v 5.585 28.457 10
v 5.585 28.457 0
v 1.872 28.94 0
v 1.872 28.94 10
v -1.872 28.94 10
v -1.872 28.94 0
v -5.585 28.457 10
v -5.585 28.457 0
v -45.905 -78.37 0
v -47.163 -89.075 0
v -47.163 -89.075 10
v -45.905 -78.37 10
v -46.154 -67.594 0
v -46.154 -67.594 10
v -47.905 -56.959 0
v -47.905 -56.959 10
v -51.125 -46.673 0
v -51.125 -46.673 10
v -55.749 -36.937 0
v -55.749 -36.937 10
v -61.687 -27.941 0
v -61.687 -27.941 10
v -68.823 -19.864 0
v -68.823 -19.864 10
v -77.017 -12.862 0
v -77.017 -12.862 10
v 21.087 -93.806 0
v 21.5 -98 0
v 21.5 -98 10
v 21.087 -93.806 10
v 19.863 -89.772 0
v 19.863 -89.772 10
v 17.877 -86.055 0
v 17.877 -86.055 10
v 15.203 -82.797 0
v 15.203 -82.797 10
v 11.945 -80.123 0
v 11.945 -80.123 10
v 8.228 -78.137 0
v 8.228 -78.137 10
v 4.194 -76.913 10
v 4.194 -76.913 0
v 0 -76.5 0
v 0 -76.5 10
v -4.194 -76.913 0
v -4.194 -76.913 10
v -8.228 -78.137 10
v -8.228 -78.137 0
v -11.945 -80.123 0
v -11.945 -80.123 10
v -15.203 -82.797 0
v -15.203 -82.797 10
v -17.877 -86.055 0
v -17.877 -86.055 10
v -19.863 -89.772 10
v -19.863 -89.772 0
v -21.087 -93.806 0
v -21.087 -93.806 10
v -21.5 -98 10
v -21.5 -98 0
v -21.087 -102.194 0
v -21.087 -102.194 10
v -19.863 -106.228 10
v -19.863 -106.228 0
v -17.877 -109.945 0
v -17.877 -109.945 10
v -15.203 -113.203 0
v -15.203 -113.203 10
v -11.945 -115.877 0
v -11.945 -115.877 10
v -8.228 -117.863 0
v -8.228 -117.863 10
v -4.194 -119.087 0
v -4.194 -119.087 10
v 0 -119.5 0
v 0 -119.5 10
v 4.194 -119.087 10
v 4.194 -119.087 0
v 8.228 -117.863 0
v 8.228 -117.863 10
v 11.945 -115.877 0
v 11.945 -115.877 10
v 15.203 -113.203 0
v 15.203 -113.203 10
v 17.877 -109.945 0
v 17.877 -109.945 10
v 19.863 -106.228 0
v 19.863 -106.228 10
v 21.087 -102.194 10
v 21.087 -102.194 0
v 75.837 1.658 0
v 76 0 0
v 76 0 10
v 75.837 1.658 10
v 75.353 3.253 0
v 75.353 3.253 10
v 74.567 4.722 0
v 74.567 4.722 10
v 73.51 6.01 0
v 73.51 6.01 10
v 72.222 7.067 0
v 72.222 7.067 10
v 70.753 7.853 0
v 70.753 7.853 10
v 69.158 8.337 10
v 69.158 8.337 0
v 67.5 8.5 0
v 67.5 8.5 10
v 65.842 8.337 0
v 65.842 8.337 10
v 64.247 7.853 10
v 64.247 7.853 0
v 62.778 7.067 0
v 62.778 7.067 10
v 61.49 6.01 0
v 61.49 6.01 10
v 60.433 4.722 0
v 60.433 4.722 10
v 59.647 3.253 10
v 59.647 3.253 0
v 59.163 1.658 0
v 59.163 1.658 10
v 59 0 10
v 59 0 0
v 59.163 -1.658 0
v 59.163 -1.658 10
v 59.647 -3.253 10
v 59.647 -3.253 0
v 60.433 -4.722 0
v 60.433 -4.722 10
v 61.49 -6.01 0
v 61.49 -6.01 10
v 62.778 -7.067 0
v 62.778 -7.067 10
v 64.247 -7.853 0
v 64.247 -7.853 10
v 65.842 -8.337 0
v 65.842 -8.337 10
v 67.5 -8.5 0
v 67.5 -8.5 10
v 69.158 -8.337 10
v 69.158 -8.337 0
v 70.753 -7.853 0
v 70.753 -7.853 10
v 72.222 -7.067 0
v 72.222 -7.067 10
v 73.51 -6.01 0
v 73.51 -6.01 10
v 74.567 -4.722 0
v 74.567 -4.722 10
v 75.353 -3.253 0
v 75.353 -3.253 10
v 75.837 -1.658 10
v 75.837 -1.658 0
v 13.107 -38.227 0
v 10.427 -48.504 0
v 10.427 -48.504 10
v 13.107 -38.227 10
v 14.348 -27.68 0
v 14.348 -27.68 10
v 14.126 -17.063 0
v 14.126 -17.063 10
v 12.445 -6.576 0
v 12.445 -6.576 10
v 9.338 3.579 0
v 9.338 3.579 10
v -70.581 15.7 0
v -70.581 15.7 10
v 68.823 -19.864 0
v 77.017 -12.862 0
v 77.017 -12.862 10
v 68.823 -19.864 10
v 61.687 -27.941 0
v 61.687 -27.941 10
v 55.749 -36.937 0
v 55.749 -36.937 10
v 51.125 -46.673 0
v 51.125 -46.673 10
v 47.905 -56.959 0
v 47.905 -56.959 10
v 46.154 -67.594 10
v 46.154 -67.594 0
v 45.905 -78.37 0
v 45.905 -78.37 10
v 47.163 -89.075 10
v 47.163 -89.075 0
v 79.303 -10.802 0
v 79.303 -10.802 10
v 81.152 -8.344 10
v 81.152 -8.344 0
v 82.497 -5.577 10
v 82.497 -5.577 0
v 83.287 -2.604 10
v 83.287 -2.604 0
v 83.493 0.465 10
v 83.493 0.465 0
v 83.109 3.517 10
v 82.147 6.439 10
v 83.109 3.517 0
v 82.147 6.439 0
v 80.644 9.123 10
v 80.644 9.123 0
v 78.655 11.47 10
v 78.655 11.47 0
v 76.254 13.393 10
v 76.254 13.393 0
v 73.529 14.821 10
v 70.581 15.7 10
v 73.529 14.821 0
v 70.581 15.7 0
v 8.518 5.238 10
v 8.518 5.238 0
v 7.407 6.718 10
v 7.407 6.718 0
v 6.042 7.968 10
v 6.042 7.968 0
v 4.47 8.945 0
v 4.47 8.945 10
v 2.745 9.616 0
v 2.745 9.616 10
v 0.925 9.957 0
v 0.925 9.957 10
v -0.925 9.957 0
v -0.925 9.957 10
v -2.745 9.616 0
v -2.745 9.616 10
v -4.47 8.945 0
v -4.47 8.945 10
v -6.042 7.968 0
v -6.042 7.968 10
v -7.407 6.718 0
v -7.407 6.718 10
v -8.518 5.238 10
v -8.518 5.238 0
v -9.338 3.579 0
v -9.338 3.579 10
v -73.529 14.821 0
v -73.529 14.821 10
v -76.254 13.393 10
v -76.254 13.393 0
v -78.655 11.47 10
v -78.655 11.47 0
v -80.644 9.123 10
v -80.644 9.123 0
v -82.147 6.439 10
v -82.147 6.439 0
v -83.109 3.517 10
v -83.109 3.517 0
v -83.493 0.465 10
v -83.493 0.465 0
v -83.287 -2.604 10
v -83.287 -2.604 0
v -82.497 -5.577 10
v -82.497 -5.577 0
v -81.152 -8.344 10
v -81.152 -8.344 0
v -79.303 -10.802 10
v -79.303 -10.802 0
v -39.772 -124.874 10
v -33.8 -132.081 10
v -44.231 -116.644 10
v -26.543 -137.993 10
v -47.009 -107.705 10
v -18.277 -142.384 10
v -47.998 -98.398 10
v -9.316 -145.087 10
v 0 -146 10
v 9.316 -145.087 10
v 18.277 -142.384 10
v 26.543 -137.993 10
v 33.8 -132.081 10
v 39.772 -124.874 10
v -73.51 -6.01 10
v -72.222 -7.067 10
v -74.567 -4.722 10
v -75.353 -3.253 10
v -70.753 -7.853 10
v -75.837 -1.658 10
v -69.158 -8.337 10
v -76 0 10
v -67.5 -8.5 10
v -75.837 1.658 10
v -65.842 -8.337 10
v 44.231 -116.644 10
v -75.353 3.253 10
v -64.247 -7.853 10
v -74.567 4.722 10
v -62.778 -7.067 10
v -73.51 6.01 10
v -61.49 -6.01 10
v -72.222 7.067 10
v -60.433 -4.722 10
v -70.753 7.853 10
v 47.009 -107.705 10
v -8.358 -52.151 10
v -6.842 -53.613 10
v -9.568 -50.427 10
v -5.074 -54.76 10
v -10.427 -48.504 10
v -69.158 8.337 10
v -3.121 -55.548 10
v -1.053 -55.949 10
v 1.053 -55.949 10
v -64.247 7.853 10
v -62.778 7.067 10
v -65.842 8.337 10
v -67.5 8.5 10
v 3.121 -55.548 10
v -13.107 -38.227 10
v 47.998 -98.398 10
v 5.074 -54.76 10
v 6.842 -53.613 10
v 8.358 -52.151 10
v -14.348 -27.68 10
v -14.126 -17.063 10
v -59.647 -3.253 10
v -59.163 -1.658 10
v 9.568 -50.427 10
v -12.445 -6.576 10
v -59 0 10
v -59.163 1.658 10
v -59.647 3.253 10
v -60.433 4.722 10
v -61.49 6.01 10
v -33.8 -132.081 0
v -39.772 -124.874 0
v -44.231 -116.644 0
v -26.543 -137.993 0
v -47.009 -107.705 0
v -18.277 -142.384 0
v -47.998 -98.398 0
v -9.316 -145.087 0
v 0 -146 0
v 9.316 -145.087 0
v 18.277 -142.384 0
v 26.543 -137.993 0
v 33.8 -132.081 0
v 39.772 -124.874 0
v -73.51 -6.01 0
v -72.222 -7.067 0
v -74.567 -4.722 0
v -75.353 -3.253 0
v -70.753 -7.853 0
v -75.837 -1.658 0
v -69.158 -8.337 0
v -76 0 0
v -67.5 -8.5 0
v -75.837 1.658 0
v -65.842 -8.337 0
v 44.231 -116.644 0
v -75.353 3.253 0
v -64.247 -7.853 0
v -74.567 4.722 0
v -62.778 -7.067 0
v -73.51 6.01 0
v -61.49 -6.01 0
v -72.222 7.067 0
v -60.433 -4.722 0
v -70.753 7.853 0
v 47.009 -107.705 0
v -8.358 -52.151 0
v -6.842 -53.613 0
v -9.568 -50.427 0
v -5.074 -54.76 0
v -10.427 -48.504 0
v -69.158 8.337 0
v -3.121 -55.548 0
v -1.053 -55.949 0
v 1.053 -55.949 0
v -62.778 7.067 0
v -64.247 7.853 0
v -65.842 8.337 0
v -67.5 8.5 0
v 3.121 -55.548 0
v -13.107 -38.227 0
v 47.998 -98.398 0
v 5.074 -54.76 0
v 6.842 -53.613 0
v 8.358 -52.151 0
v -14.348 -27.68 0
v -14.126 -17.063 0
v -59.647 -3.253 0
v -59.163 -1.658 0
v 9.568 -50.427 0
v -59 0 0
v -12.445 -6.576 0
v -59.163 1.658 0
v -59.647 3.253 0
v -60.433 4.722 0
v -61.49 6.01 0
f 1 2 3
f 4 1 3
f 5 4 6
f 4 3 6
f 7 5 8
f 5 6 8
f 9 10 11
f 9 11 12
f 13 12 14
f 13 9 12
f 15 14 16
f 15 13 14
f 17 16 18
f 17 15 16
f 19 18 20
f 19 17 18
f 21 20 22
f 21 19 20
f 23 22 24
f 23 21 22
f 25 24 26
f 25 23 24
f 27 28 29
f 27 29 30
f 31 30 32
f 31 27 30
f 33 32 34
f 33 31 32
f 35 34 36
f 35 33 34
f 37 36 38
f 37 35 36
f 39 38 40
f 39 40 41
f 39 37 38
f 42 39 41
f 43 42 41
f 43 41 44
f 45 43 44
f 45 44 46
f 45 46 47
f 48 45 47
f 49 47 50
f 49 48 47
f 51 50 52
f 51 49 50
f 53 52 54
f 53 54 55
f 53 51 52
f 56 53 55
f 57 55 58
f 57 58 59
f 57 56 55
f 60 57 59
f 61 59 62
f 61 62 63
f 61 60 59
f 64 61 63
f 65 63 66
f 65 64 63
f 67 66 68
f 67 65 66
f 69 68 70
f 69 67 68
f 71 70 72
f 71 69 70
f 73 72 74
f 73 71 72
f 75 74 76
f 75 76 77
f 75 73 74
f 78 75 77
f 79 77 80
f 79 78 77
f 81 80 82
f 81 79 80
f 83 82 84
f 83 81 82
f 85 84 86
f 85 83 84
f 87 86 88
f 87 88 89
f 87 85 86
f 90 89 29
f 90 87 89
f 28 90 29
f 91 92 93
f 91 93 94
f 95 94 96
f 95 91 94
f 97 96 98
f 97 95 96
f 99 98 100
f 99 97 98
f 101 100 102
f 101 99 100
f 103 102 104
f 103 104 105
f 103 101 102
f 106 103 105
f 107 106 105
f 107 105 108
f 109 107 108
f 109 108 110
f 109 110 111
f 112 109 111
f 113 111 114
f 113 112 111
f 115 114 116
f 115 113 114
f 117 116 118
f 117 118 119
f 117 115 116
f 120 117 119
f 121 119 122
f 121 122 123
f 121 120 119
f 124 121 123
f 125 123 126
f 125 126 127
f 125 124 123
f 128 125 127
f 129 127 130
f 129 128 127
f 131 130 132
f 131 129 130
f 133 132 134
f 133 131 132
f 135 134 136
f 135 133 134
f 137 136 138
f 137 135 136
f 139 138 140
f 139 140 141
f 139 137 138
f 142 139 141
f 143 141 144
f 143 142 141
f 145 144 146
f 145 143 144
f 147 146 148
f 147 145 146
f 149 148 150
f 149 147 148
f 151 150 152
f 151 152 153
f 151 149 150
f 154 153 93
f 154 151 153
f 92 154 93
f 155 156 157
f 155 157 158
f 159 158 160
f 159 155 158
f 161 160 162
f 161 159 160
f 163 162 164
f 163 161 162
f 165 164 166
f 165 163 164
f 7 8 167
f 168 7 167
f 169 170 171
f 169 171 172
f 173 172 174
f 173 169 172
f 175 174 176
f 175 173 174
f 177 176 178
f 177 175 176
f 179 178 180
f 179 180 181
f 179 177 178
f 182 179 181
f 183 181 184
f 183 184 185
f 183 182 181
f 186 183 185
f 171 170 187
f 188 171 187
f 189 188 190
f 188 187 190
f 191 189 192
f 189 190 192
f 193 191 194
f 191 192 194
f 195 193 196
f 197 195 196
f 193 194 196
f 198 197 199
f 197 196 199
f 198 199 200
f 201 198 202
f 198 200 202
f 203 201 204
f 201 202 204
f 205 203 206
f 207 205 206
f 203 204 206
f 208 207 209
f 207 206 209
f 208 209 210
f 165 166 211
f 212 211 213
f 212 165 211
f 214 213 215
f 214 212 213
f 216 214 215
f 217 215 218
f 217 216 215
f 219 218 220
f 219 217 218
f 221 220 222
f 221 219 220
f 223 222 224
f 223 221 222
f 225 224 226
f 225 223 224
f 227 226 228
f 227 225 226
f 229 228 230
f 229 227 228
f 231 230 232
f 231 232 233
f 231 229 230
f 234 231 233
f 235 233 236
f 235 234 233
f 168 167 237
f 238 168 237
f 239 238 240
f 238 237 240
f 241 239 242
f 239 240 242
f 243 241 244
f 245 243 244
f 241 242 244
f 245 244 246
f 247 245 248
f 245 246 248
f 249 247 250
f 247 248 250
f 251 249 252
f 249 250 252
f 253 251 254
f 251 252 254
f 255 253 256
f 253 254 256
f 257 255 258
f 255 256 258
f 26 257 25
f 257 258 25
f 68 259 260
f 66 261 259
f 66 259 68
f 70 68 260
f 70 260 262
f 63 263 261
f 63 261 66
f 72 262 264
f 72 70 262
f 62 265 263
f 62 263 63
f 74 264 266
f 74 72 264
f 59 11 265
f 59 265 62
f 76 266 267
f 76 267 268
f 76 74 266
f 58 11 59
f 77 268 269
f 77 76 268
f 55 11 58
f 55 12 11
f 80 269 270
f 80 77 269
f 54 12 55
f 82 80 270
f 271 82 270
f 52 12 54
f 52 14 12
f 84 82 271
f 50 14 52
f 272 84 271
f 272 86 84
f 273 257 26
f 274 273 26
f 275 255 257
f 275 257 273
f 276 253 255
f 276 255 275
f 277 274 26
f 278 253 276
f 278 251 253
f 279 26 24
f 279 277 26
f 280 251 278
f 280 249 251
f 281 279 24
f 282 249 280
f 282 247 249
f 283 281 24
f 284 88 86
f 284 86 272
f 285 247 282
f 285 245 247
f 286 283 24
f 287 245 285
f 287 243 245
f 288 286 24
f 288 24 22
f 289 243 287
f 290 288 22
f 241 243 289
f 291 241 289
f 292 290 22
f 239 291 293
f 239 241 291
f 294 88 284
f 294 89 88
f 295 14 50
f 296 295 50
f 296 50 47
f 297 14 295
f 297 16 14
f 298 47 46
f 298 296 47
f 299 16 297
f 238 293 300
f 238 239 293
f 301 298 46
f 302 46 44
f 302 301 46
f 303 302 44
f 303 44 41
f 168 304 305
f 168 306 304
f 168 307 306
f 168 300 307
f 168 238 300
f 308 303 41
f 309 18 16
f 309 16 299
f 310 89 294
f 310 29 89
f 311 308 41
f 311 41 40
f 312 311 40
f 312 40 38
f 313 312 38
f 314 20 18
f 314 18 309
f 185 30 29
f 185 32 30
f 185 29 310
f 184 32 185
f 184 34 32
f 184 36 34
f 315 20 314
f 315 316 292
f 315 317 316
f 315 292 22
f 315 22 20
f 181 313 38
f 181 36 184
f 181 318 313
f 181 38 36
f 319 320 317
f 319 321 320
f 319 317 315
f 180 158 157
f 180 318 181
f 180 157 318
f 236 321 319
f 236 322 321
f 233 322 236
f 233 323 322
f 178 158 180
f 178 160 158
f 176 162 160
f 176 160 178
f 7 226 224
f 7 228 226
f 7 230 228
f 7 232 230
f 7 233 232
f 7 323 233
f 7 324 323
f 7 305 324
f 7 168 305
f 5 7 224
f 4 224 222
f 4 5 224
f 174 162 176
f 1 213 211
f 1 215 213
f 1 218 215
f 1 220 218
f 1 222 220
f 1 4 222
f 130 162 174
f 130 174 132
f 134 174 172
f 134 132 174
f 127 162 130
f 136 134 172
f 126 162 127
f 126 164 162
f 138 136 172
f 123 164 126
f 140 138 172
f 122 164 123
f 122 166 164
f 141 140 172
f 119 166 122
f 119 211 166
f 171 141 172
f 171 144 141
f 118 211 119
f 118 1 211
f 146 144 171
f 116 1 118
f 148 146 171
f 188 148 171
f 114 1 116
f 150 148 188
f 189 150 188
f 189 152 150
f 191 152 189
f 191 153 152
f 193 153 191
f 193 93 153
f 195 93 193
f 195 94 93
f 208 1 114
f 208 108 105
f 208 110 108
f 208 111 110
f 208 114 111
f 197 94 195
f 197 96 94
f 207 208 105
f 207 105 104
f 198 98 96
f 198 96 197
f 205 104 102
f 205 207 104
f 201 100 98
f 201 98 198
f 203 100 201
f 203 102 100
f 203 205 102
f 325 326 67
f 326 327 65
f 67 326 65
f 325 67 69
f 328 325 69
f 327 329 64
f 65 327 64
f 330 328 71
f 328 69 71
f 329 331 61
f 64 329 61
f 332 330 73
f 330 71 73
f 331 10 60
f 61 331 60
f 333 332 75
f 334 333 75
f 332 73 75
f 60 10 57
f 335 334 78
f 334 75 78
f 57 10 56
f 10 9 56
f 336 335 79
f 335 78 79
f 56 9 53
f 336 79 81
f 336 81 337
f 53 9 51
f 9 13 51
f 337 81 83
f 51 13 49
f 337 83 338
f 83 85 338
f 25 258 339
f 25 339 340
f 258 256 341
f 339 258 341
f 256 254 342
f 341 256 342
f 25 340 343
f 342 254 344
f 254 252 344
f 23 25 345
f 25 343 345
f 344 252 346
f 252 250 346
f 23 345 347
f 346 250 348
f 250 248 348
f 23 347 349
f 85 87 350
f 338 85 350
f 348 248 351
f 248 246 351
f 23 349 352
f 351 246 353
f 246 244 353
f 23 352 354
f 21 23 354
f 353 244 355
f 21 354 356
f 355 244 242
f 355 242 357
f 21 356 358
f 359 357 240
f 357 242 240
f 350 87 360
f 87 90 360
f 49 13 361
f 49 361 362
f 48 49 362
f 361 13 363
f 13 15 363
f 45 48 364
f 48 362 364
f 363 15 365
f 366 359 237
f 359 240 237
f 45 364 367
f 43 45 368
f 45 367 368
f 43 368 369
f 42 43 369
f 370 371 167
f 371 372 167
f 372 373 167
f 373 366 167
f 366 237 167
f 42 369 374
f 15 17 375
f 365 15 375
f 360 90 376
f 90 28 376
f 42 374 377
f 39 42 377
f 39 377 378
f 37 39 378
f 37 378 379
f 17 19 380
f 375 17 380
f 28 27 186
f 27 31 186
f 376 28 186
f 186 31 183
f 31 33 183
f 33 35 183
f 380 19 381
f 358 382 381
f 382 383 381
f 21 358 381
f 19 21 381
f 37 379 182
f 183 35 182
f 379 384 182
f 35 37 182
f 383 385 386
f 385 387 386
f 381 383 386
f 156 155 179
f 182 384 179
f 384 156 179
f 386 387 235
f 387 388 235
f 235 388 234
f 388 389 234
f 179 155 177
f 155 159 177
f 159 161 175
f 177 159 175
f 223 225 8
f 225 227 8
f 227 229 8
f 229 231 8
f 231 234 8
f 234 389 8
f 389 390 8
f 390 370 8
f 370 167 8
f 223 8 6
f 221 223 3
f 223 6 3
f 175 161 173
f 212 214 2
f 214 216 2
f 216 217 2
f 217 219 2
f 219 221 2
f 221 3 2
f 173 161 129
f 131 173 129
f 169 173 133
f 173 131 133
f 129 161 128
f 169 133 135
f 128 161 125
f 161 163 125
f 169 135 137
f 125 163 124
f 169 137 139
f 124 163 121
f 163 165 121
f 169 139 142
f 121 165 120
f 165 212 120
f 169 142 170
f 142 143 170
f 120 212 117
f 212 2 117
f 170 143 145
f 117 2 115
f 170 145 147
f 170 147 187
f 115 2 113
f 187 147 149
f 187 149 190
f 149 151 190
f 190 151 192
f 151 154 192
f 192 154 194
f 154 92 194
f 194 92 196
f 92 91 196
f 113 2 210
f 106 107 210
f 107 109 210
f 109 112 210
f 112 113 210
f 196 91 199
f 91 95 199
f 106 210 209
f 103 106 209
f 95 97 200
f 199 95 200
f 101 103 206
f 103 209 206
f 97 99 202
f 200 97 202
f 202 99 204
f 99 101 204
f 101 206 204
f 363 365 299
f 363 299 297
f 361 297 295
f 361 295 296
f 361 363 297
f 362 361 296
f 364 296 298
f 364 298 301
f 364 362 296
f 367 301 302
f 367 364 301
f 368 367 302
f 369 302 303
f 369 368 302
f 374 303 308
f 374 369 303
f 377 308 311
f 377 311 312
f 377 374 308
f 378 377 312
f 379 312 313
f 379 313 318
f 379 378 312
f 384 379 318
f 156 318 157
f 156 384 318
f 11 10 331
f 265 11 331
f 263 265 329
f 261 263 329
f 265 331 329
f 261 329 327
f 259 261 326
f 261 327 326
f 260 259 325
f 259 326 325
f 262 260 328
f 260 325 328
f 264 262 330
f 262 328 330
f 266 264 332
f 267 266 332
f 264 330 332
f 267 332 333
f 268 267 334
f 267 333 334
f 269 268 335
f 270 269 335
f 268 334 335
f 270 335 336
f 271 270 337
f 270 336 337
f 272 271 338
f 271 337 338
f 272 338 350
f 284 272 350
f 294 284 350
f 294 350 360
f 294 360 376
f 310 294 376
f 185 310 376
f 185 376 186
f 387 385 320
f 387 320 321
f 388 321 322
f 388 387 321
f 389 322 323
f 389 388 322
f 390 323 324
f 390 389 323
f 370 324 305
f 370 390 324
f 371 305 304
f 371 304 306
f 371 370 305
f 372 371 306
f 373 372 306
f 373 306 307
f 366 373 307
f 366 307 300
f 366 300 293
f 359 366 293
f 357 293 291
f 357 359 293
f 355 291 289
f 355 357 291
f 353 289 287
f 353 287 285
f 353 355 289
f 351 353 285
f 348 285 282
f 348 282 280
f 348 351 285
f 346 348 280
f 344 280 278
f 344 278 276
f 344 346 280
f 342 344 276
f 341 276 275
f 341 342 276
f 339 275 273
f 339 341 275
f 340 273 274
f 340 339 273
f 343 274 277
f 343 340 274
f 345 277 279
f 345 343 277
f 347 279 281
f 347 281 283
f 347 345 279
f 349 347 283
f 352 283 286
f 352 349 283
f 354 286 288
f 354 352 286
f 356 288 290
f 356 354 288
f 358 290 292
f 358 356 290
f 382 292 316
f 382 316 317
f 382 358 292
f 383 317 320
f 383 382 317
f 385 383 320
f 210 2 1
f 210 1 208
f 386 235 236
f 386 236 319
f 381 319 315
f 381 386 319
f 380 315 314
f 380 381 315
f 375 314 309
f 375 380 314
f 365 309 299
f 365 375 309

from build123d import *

# Parameters (mm, degrees)
SKETCH_R   = 8.5
SKETCH_R_2 = 21.5
PAD_DEPTH  = 10


with BuildPart() as part:
    # Sketch → Pad (new body)
    with BuildSketch(Plane.XY):
        with BuildLine():
            ThreePointArc((-47.162932, -89.074877), (0, -146), (47.162932, -89.074877))
            ThreePointArc((77.017443, -12.861504), (51.124626, -46.672731), (47.162932, -89.074877))
            ThreePointArc((77.017443, -12.861504), (83.108641, 3.517146), (70.581481, 15.700461))
            Line((5.585185, 28.457085), (70.581481, 15.700461))
            ThreePointArc((5.585185, 28.457085), (0, 29), (-5.585185, 28.457085))
            Line((-5.585185, 28.457085), (-70.581481, 15.700461))
            ThreePointArc((-70.581481, 15.700461), (-83.108641, 3.517146), (-77.017443, -12.861504))
            ThreePointArc((-47.162932, -89.074877), (-51.124626, -46.672731), (-77.017443, -12.861504))
        make_face()
        with Locations((-67.5, 0)):
            Circle(SKETCH_R, mode=Mode.SUBTRACT)
        with Locations((67.5, 0)):
            Circle(SKETCH_R, mode=Mode.SUBTRACT)
        with Locations((0, -98)):
            Circle(SKETCH_R_2, mode=Mode.SUBTRACT)
        with BuildLine():
            ThreePointArc((9.337686, 3.578773), (0, 10), (-9.337686, 3.578773))
            ThreePointArc((-9.337686, 3.578773), (-14.420663, -22.367539), (-10.427083, -48.503704))
            ThreePointArc((-10.427083, -48.503704), (0, -56), (10.427083, -48.503704))
            ThreePointArc((10.427083, -48.503704), (14.420663, -22.367539), (9.337686, 3.578773))
        make_face(mode=Mode.SUBTRACT)
    extrude(amount=PAD_DEPTH)


solid = part.part
